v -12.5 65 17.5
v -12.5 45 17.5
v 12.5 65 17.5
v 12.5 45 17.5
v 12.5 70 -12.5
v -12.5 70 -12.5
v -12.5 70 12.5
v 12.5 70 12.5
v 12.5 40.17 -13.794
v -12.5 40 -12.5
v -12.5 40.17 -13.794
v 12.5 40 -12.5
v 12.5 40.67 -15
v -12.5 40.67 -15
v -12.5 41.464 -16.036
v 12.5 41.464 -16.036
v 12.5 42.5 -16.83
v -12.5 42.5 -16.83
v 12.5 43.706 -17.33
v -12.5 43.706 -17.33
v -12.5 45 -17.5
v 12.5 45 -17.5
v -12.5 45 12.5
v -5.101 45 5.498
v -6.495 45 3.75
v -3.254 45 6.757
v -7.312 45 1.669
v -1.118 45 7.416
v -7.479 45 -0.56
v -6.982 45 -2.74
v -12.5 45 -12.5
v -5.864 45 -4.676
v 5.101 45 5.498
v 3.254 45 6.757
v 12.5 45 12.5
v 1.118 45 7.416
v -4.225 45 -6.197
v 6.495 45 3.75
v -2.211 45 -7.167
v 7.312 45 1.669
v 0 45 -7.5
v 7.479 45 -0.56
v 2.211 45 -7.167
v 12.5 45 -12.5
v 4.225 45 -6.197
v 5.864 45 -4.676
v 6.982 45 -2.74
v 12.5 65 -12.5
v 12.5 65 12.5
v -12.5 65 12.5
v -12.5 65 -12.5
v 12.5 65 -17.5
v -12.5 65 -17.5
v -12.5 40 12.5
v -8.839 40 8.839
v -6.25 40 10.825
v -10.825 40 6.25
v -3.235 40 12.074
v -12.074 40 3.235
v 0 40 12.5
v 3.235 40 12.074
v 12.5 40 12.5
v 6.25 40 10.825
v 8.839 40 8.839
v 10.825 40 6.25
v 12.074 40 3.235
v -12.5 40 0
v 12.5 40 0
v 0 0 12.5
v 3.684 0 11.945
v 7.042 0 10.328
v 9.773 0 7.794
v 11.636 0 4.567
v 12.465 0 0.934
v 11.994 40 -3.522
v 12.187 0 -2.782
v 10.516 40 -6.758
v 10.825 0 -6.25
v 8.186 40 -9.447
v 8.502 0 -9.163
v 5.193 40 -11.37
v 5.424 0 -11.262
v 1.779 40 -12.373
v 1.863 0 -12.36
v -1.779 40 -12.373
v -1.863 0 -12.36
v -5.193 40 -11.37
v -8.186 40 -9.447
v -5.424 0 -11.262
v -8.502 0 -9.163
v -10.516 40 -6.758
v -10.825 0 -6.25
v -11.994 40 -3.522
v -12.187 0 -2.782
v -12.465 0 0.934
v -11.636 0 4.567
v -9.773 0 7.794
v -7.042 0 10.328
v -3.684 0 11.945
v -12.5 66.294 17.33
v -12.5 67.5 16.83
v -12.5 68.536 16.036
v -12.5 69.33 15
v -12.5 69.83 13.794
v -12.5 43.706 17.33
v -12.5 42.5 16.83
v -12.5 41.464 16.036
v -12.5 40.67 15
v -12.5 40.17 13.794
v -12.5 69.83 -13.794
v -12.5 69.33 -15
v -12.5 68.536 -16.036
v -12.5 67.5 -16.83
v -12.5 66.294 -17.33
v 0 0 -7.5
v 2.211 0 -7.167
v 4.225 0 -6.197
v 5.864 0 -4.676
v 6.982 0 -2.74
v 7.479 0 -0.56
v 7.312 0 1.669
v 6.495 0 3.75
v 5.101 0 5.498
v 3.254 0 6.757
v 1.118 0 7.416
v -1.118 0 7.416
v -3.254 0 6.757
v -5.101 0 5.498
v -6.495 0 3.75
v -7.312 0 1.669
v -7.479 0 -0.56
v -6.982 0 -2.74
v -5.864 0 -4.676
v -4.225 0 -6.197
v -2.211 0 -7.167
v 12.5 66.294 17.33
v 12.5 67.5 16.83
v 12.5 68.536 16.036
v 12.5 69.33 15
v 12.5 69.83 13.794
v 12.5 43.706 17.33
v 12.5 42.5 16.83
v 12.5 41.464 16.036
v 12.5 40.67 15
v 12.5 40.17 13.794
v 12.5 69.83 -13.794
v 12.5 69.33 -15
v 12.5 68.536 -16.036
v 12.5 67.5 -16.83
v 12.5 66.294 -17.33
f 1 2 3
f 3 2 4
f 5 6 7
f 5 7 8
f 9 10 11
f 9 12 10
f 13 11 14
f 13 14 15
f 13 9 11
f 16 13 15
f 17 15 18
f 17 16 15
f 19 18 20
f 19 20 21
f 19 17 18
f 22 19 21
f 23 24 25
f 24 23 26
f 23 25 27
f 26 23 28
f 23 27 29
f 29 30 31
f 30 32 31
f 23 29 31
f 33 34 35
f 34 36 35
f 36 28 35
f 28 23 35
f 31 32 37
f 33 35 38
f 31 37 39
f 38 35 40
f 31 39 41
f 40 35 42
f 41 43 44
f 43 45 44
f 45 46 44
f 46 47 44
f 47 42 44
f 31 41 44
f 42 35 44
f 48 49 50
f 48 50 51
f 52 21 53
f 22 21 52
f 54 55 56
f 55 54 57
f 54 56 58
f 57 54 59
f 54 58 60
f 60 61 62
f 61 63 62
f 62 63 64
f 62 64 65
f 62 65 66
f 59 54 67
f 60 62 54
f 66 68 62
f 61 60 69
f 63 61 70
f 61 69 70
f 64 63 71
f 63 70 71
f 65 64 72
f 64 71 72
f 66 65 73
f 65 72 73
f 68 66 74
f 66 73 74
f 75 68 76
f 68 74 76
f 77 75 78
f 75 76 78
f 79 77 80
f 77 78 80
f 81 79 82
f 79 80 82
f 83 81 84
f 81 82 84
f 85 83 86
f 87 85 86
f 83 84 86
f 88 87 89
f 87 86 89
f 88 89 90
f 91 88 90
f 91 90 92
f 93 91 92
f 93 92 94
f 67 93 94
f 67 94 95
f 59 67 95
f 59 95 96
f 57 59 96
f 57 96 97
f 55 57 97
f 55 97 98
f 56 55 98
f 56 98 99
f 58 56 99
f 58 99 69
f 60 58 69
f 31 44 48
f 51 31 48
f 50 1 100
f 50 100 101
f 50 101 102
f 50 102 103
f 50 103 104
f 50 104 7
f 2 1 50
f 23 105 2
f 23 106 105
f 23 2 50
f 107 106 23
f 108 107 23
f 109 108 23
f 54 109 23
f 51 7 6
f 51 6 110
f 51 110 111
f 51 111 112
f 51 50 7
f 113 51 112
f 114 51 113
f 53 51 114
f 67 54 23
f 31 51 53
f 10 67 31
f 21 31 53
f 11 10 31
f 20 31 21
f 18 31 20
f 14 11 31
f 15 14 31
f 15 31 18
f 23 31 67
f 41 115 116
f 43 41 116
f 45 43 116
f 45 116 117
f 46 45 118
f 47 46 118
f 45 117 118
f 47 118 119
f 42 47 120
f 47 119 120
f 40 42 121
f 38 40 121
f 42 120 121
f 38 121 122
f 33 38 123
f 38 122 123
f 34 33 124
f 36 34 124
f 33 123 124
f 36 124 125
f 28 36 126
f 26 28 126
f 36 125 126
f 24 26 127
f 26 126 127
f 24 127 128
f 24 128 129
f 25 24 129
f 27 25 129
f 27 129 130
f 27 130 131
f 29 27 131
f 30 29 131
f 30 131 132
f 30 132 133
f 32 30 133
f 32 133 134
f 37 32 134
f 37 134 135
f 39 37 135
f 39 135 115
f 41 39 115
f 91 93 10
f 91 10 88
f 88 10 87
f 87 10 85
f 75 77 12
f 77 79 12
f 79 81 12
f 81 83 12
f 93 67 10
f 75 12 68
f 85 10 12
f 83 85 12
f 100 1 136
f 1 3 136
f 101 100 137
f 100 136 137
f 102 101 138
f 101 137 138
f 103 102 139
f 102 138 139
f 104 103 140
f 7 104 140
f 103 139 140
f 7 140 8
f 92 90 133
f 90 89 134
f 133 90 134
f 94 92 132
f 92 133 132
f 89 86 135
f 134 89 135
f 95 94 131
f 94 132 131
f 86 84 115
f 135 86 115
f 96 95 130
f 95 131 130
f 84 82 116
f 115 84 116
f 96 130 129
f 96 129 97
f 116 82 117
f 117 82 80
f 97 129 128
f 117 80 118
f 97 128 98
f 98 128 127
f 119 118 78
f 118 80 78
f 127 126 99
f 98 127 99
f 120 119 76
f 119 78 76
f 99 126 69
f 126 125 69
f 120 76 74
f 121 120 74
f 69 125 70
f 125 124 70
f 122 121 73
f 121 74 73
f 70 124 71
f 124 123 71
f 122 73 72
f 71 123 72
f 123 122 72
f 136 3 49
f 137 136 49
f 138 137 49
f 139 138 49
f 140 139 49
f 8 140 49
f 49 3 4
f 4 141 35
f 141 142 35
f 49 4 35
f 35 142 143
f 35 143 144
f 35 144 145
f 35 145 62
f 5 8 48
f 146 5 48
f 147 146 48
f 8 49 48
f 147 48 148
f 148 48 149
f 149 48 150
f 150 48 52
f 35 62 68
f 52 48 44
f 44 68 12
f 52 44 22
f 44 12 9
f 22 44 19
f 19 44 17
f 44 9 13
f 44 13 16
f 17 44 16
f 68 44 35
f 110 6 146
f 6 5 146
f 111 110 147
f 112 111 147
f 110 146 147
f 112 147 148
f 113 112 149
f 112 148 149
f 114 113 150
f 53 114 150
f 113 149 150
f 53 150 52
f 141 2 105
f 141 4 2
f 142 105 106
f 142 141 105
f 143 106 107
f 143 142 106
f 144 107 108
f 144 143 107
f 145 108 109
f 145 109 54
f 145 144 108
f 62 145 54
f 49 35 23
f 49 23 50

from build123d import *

# Parameters (mm, degrees)
SKETCH1_R           = 12.5
BOSS_EXTRUDE1_DEPTH = 40
SKETCH2_W           = 25
SKETCH2_H           = 35
BOSS_EXTRUDE2_DEPTH = 30
SKETCH3_W           = 25
SKETCH3_H           = 20
CUT_EXTRUDE1_DEPTH  = 77.362621747
FILLET1_R           = 5
SKETCH4_R           = 7.5
CUT_EXTRUDE2_DEPTH  = 65


with BuildPart() as part:
    # Sketch1 → Boss-Extrude1 (new body)
    with BuildSketch(Plane(origin=(0, 0, 0), x_dir=(1, 0, 0), z_dir=(0, 1, 0))):
        with Locations(Location((0, 0, 0), (0, 0, 270))):
            Circle(SKETCH1_R)
    extrude(amount=BOSS_EXTRUDE1_DEPTH)

    # Sketch2 → Boss-Extrude2 (add)
    with BuildSketch(Plane(origin=(0, 40, 0), x_dir=(1, 0, 0), z_dir=(0, 1, 0))):
        Rectangle(SKETCH2_W, SKETCH2_H)
    extrude(amount=BOSS_EXTRUDE2_DEPTH)

    # Sketch3 → Cut-Extrude1 (cut, through all)
    with BuildSketch(Plane(origin=(12.5, 0, 0), x_dir=(0, 0, -1), z_dir=(1, 0, 0))):
        with Locations((0, 55)):
            Rectangle(SKETCH3_W, SKETCH3_H)
    extrude(amount=-CUT_EXTRUDE1_DEPTH, mode=Mode.SUBTRACT)

    # Fillet1
    fillet1_edges = [part.edges().sort_by_distance(p)[0] for p in [
        (0, 40, 17.5),
        (0, 40, -17.5),
        (0, 70, 17.5),
        (0, 70, -17.5),
    ]]
    fillet(fillet1_edges, radius=FILLET1_R - 0.0001)  # a hair under: the kernel refuses the full size

    # Sketch4 → Cut-Extrude2 (cut)
    with BuildSketch(Plane.XZ):
        with Locations(Location((0, 0, 0), (0, 0, 270))):
            Circle(SKETCH4_R)
    extrude(amount=-CUT_EXTRUDE2_DEPTH, mode=Mode.SUBTRACT)


solid = part.part
